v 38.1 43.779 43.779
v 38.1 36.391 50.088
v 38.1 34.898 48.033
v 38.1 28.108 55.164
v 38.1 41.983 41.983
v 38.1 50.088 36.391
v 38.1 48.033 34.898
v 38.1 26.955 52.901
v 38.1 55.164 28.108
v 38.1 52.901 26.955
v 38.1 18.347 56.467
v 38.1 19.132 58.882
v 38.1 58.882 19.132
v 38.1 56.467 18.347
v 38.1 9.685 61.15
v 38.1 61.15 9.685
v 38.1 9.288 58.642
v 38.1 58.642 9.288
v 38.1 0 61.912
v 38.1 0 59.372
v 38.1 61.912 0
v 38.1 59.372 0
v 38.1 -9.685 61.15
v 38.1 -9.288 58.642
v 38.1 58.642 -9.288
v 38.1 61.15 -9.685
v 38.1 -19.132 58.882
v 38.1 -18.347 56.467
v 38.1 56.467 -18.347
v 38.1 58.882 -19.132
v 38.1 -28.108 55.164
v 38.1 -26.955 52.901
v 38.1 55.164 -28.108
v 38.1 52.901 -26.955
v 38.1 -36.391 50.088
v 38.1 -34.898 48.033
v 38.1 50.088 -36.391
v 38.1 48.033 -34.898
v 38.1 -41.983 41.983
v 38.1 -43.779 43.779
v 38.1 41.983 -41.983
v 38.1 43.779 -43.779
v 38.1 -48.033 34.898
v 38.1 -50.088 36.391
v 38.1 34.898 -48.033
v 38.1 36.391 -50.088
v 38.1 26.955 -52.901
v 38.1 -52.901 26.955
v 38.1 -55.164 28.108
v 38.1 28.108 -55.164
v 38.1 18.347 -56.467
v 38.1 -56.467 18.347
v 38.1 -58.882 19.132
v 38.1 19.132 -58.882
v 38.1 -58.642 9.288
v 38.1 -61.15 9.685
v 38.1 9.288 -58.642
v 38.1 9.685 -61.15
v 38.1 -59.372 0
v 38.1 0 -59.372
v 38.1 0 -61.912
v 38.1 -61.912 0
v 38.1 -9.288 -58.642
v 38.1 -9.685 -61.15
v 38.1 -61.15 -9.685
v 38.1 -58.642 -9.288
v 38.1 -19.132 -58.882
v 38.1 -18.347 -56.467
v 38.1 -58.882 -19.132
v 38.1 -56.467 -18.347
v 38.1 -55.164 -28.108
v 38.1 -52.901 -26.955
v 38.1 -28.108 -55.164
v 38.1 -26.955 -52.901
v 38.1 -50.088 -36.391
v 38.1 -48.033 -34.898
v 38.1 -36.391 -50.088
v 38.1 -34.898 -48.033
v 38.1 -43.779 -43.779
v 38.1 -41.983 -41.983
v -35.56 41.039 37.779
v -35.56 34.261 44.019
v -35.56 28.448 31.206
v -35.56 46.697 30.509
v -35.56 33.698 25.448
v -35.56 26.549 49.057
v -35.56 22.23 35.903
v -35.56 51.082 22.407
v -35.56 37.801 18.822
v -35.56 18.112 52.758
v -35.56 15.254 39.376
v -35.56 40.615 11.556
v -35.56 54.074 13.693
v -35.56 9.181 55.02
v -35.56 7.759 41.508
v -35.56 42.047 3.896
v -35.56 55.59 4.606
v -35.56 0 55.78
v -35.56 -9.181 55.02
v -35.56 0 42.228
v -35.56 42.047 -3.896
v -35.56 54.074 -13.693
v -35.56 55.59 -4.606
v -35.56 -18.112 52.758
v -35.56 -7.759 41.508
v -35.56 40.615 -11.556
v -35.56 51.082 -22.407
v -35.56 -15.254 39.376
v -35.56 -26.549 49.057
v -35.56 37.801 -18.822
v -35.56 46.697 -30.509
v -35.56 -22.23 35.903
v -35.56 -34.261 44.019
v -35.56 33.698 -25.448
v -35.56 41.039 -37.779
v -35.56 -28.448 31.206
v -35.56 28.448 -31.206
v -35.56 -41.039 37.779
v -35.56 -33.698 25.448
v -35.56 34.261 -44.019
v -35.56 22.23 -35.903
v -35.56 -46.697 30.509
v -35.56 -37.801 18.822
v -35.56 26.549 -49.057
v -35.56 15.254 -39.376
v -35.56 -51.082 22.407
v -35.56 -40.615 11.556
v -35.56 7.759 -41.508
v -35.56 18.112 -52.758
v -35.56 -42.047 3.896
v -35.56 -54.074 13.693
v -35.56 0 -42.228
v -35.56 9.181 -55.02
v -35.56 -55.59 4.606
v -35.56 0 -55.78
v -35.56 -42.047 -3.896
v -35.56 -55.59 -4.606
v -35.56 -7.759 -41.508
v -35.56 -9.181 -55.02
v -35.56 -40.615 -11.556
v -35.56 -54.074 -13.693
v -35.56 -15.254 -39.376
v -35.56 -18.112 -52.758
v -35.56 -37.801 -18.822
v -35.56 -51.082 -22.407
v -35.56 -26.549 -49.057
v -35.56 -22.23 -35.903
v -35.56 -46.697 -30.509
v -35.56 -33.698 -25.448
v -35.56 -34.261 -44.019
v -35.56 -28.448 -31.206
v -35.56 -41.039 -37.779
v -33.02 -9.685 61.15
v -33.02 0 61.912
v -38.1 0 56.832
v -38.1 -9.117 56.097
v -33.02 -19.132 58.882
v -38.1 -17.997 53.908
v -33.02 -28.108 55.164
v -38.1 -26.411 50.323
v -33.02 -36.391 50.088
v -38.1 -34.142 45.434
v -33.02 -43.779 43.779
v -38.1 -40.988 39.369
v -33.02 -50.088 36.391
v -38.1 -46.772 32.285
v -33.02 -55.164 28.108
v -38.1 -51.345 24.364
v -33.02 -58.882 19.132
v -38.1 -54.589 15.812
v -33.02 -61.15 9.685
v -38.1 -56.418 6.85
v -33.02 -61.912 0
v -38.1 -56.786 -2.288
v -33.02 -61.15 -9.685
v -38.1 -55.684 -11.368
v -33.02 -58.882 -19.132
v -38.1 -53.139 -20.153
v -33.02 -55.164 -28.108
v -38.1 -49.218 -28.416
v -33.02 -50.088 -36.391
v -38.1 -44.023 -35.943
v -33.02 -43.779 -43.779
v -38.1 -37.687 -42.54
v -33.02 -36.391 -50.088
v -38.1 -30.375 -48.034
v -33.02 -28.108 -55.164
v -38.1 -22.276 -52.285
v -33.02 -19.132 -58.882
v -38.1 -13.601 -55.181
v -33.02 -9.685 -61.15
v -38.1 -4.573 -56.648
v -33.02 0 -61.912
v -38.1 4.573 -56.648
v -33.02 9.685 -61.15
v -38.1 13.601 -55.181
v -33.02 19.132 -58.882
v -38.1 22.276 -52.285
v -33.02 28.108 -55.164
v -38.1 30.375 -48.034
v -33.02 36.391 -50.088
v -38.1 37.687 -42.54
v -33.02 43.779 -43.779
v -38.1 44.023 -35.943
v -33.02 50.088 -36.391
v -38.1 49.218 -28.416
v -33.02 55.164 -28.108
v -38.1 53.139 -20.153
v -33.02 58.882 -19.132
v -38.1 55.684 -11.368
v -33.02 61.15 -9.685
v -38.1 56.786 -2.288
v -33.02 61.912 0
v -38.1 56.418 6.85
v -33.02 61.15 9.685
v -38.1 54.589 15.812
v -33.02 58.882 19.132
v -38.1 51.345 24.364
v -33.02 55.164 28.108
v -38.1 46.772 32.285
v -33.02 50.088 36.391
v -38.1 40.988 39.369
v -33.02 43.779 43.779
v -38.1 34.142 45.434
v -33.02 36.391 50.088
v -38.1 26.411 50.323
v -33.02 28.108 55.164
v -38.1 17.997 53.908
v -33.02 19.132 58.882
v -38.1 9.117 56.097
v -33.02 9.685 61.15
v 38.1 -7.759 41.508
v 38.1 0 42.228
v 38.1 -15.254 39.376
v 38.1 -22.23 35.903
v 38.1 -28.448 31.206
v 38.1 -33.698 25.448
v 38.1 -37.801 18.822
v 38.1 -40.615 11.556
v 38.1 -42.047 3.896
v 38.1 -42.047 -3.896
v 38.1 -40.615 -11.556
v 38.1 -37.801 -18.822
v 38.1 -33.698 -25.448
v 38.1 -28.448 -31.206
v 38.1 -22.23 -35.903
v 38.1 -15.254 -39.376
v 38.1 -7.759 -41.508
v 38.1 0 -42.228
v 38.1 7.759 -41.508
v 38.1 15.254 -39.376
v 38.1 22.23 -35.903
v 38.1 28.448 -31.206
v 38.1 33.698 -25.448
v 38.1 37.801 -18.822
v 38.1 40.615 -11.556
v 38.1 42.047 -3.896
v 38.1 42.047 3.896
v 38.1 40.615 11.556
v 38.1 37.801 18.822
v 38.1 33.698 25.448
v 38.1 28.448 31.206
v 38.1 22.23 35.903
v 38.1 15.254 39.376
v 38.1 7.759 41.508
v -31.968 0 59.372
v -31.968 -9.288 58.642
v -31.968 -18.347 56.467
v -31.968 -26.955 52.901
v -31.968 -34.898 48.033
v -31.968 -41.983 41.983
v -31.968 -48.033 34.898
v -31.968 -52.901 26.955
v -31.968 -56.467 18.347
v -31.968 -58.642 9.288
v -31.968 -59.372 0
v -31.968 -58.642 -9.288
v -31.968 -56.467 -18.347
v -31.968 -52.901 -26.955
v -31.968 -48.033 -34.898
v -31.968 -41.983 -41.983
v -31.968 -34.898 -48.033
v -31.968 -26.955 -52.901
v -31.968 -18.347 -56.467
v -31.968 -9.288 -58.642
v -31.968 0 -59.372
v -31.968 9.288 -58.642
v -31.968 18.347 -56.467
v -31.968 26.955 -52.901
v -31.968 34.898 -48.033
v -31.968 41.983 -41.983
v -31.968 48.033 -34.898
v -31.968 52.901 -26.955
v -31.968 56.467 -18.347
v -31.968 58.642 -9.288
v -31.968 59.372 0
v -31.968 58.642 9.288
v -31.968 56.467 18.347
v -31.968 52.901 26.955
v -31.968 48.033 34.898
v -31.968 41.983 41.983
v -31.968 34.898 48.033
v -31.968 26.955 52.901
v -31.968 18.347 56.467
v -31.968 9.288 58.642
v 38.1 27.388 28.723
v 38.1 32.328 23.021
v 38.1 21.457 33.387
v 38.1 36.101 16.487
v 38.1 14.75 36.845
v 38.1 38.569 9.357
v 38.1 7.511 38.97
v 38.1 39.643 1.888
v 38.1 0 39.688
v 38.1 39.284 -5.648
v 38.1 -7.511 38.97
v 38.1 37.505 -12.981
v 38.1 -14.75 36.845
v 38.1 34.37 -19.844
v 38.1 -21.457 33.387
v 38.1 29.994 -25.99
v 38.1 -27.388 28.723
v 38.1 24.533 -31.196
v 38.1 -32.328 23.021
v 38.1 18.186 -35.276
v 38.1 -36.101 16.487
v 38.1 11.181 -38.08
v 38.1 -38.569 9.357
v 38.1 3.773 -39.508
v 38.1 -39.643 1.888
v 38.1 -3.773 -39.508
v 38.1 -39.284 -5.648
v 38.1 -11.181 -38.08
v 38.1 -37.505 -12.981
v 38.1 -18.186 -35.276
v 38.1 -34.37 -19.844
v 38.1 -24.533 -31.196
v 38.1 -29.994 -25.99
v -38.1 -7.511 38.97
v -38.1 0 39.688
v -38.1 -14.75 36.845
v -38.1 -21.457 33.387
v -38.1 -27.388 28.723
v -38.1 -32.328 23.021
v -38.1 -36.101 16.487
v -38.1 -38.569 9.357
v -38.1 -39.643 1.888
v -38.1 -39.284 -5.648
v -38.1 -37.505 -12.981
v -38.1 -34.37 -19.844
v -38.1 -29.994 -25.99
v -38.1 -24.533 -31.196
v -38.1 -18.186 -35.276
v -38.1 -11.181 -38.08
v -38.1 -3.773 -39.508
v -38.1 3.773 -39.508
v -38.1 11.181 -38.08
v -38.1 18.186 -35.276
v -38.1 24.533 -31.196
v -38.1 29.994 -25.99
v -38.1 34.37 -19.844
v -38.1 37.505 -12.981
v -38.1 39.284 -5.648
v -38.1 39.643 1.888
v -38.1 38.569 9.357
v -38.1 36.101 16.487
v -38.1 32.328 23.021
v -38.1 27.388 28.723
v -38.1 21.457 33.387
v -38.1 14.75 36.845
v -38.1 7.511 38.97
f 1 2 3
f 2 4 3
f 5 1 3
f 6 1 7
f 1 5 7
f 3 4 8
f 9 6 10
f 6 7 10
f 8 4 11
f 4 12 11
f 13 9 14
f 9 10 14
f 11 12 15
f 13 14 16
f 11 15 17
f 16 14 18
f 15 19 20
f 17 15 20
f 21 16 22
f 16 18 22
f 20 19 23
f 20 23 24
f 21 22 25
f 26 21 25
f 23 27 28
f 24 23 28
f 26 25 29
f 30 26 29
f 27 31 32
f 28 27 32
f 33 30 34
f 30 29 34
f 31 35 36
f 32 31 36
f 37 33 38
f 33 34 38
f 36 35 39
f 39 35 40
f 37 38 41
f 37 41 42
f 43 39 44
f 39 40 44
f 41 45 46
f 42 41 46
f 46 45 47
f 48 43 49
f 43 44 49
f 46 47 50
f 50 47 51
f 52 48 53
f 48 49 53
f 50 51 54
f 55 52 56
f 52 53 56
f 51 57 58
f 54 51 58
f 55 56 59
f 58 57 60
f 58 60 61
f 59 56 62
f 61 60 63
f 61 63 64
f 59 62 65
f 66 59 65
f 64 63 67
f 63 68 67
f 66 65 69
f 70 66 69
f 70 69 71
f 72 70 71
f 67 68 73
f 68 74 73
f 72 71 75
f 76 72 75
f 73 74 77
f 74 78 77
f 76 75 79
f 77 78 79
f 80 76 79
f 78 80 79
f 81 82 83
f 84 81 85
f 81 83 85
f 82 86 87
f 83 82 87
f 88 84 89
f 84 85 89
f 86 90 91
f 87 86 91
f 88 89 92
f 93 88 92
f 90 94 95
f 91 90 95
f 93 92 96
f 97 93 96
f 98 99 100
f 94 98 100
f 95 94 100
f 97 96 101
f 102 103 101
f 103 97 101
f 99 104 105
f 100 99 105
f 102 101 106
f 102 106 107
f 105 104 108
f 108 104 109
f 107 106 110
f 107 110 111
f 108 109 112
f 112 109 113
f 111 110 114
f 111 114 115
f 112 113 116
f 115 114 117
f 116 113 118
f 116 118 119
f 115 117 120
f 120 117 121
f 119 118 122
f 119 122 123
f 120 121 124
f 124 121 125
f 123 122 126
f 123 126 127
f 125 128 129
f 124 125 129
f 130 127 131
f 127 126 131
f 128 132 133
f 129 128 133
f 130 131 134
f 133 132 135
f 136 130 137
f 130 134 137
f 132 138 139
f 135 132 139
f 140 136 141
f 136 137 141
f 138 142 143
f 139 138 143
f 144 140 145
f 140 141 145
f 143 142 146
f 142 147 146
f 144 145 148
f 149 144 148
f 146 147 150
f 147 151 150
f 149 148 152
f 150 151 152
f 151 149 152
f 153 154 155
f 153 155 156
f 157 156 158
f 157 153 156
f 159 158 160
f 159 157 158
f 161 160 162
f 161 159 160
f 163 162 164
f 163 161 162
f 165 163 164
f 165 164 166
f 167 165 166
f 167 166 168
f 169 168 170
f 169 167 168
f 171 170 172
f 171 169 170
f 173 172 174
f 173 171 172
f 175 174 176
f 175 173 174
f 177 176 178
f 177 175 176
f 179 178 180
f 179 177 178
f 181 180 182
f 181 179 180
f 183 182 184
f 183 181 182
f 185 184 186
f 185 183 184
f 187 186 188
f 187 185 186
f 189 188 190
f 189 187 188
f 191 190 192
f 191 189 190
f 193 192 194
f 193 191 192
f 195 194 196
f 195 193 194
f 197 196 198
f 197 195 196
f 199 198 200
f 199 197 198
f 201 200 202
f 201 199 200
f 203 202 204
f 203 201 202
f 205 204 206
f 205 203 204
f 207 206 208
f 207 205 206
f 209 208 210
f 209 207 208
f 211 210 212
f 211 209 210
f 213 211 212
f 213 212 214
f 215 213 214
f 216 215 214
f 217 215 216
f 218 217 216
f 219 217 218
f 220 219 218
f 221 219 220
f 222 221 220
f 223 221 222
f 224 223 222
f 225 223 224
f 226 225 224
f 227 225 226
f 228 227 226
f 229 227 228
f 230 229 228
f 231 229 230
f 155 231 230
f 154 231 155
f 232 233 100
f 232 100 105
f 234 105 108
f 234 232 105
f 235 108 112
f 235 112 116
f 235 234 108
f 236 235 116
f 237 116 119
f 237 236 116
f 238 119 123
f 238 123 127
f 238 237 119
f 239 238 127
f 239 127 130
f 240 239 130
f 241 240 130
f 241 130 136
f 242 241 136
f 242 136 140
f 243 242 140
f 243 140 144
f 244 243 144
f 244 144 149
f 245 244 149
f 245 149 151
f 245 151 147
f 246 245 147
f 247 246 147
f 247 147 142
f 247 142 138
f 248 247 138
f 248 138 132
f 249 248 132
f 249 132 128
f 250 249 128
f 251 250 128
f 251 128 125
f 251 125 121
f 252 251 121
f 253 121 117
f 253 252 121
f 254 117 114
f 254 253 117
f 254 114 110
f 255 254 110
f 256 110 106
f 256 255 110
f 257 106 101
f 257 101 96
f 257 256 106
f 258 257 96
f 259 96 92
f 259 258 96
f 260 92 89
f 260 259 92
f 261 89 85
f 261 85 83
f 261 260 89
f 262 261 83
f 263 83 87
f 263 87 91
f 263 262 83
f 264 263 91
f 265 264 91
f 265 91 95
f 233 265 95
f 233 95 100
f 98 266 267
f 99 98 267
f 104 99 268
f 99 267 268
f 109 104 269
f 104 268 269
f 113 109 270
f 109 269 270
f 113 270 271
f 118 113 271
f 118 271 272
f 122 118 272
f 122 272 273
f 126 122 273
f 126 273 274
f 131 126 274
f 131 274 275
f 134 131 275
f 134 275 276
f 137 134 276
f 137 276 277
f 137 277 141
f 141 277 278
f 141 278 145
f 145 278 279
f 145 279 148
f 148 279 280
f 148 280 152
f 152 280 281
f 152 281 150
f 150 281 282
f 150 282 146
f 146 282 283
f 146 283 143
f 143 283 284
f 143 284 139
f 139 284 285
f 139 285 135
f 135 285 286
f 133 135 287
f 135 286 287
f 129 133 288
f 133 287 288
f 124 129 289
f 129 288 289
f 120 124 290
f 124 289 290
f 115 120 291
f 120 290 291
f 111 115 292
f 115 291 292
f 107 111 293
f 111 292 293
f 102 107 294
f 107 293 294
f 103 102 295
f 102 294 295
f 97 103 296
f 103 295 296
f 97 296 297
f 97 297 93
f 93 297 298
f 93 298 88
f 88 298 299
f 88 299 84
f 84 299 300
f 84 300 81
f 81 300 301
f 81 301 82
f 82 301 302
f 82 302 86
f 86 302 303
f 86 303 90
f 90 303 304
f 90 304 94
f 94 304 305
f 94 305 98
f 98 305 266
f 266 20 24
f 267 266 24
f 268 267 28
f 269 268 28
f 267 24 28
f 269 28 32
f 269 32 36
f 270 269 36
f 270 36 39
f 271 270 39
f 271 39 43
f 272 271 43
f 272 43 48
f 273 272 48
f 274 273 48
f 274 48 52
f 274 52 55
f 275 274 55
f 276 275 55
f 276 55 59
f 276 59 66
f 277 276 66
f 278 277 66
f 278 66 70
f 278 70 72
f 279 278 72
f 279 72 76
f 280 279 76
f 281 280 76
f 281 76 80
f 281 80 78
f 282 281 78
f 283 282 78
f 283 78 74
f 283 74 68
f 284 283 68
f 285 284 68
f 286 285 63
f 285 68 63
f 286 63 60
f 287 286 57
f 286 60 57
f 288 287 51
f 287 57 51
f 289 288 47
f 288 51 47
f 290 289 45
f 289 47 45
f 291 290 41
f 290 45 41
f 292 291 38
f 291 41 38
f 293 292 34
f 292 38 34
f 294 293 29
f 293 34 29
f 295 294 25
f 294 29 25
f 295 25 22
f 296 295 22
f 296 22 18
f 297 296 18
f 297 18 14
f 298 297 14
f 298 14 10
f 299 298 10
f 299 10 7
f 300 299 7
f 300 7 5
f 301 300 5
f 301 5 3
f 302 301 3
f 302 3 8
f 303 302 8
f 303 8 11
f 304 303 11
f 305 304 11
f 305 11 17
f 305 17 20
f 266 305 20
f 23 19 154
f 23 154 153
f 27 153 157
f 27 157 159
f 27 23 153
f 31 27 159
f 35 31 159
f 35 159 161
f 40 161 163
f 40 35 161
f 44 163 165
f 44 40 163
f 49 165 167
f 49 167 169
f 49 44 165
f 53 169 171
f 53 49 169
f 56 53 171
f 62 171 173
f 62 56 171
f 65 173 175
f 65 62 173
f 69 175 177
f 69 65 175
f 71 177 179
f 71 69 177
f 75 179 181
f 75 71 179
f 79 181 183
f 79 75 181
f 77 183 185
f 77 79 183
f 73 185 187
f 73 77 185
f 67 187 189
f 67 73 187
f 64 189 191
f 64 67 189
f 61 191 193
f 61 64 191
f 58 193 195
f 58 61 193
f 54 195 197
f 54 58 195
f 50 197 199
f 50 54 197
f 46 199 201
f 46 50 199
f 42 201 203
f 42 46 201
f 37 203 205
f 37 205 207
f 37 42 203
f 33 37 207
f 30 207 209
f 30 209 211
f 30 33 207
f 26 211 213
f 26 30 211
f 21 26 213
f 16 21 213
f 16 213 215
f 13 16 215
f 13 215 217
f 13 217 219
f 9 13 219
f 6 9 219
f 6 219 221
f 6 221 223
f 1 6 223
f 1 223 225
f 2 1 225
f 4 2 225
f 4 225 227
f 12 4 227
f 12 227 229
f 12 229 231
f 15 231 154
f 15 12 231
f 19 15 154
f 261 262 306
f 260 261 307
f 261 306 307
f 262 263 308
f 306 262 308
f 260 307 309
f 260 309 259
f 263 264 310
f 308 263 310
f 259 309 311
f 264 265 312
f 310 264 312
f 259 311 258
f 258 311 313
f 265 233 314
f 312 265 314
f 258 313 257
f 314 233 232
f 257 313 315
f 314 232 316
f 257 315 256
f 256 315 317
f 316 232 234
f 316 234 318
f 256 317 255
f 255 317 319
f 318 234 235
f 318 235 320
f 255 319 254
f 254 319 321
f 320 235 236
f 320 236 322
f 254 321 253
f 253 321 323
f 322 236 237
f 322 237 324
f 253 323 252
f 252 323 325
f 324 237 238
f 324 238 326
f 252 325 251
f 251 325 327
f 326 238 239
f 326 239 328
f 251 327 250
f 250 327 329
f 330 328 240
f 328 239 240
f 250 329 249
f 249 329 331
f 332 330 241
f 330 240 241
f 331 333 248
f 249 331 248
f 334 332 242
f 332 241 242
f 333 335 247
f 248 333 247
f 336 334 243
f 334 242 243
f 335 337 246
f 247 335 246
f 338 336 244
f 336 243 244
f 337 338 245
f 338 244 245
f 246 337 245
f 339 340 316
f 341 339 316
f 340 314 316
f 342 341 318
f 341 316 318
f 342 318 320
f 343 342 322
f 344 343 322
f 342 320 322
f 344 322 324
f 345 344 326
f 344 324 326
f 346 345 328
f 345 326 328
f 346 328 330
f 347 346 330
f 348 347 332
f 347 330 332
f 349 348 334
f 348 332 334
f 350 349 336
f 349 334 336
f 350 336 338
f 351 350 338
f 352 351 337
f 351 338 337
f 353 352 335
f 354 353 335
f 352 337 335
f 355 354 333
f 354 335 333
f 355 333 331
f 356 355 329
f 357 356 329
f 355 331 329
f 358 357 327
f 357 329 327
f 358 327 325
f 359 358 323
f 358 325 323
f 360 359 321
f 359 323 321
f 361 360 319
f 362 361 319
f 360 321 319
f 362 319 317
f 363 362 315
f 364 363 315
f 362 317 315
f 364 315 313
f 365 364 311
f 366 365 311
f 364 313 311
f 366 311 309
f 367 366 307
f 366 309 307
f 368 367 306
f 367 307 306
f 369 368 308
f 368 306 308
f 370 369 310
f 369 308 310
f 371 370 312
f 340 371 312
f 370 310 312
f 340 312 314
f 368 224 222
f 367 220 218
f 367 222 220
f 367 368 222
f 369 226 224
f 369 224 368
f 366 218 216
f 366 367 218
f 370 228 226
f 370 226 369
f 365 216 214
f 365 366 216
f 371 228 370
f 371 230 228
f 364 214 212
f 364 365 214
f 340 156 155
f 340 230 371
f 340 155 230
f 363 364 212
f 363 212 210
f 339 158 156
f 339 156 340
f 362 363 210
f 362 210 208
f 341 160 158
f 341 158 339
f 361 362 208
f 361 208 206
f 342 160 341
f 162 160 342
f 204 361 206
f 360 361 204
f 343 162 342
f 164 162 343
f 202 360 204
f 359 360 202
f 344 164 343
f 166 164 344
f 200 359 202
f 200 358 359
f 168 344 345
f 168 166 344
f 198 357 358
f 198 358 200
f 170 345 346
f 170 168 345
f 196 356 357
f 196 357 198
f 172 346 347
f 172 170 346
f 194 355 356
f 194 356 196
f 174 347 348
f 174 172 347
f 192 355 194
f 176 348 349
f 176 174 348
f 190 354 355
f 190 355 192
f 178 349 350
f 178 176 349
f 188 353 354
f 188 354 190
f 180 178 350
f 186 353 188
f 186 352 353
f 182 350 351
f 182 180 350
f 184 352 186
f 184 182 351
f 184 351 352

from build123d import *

# Parameters (mm, degrees)
F0_W    = 76.2
F0_H    = 22.225
F2_SIZE = 5.08
F3_T    = -2.54


with BuildPart() as f1:
    # F0 (on Front) → F1 (revolve)
    with BuildSketch(Plane.XZ):
        with Locations((0, 50.8)):
            Rectangle(F0_W, F0_H)
    revolve(axis=Axis((-6.255699, 0, 0), (1, 0, 0)))

    # F2
    f2_edges = [f1.edges().sort_by_distance(p)[0] for p in [
        (-38.1, 0, -61.9125),
    ]]
    chamfer(f2_edges, length=F2_SIZE)

    # F3
    f3_openings = [f1.faces().sort_by_distance(p)[0] for p in [
        (38.1, 0, -41.43865),
    ]]
    offset(amount=F3_T, openings=f3_openings)


solid = f1.part
